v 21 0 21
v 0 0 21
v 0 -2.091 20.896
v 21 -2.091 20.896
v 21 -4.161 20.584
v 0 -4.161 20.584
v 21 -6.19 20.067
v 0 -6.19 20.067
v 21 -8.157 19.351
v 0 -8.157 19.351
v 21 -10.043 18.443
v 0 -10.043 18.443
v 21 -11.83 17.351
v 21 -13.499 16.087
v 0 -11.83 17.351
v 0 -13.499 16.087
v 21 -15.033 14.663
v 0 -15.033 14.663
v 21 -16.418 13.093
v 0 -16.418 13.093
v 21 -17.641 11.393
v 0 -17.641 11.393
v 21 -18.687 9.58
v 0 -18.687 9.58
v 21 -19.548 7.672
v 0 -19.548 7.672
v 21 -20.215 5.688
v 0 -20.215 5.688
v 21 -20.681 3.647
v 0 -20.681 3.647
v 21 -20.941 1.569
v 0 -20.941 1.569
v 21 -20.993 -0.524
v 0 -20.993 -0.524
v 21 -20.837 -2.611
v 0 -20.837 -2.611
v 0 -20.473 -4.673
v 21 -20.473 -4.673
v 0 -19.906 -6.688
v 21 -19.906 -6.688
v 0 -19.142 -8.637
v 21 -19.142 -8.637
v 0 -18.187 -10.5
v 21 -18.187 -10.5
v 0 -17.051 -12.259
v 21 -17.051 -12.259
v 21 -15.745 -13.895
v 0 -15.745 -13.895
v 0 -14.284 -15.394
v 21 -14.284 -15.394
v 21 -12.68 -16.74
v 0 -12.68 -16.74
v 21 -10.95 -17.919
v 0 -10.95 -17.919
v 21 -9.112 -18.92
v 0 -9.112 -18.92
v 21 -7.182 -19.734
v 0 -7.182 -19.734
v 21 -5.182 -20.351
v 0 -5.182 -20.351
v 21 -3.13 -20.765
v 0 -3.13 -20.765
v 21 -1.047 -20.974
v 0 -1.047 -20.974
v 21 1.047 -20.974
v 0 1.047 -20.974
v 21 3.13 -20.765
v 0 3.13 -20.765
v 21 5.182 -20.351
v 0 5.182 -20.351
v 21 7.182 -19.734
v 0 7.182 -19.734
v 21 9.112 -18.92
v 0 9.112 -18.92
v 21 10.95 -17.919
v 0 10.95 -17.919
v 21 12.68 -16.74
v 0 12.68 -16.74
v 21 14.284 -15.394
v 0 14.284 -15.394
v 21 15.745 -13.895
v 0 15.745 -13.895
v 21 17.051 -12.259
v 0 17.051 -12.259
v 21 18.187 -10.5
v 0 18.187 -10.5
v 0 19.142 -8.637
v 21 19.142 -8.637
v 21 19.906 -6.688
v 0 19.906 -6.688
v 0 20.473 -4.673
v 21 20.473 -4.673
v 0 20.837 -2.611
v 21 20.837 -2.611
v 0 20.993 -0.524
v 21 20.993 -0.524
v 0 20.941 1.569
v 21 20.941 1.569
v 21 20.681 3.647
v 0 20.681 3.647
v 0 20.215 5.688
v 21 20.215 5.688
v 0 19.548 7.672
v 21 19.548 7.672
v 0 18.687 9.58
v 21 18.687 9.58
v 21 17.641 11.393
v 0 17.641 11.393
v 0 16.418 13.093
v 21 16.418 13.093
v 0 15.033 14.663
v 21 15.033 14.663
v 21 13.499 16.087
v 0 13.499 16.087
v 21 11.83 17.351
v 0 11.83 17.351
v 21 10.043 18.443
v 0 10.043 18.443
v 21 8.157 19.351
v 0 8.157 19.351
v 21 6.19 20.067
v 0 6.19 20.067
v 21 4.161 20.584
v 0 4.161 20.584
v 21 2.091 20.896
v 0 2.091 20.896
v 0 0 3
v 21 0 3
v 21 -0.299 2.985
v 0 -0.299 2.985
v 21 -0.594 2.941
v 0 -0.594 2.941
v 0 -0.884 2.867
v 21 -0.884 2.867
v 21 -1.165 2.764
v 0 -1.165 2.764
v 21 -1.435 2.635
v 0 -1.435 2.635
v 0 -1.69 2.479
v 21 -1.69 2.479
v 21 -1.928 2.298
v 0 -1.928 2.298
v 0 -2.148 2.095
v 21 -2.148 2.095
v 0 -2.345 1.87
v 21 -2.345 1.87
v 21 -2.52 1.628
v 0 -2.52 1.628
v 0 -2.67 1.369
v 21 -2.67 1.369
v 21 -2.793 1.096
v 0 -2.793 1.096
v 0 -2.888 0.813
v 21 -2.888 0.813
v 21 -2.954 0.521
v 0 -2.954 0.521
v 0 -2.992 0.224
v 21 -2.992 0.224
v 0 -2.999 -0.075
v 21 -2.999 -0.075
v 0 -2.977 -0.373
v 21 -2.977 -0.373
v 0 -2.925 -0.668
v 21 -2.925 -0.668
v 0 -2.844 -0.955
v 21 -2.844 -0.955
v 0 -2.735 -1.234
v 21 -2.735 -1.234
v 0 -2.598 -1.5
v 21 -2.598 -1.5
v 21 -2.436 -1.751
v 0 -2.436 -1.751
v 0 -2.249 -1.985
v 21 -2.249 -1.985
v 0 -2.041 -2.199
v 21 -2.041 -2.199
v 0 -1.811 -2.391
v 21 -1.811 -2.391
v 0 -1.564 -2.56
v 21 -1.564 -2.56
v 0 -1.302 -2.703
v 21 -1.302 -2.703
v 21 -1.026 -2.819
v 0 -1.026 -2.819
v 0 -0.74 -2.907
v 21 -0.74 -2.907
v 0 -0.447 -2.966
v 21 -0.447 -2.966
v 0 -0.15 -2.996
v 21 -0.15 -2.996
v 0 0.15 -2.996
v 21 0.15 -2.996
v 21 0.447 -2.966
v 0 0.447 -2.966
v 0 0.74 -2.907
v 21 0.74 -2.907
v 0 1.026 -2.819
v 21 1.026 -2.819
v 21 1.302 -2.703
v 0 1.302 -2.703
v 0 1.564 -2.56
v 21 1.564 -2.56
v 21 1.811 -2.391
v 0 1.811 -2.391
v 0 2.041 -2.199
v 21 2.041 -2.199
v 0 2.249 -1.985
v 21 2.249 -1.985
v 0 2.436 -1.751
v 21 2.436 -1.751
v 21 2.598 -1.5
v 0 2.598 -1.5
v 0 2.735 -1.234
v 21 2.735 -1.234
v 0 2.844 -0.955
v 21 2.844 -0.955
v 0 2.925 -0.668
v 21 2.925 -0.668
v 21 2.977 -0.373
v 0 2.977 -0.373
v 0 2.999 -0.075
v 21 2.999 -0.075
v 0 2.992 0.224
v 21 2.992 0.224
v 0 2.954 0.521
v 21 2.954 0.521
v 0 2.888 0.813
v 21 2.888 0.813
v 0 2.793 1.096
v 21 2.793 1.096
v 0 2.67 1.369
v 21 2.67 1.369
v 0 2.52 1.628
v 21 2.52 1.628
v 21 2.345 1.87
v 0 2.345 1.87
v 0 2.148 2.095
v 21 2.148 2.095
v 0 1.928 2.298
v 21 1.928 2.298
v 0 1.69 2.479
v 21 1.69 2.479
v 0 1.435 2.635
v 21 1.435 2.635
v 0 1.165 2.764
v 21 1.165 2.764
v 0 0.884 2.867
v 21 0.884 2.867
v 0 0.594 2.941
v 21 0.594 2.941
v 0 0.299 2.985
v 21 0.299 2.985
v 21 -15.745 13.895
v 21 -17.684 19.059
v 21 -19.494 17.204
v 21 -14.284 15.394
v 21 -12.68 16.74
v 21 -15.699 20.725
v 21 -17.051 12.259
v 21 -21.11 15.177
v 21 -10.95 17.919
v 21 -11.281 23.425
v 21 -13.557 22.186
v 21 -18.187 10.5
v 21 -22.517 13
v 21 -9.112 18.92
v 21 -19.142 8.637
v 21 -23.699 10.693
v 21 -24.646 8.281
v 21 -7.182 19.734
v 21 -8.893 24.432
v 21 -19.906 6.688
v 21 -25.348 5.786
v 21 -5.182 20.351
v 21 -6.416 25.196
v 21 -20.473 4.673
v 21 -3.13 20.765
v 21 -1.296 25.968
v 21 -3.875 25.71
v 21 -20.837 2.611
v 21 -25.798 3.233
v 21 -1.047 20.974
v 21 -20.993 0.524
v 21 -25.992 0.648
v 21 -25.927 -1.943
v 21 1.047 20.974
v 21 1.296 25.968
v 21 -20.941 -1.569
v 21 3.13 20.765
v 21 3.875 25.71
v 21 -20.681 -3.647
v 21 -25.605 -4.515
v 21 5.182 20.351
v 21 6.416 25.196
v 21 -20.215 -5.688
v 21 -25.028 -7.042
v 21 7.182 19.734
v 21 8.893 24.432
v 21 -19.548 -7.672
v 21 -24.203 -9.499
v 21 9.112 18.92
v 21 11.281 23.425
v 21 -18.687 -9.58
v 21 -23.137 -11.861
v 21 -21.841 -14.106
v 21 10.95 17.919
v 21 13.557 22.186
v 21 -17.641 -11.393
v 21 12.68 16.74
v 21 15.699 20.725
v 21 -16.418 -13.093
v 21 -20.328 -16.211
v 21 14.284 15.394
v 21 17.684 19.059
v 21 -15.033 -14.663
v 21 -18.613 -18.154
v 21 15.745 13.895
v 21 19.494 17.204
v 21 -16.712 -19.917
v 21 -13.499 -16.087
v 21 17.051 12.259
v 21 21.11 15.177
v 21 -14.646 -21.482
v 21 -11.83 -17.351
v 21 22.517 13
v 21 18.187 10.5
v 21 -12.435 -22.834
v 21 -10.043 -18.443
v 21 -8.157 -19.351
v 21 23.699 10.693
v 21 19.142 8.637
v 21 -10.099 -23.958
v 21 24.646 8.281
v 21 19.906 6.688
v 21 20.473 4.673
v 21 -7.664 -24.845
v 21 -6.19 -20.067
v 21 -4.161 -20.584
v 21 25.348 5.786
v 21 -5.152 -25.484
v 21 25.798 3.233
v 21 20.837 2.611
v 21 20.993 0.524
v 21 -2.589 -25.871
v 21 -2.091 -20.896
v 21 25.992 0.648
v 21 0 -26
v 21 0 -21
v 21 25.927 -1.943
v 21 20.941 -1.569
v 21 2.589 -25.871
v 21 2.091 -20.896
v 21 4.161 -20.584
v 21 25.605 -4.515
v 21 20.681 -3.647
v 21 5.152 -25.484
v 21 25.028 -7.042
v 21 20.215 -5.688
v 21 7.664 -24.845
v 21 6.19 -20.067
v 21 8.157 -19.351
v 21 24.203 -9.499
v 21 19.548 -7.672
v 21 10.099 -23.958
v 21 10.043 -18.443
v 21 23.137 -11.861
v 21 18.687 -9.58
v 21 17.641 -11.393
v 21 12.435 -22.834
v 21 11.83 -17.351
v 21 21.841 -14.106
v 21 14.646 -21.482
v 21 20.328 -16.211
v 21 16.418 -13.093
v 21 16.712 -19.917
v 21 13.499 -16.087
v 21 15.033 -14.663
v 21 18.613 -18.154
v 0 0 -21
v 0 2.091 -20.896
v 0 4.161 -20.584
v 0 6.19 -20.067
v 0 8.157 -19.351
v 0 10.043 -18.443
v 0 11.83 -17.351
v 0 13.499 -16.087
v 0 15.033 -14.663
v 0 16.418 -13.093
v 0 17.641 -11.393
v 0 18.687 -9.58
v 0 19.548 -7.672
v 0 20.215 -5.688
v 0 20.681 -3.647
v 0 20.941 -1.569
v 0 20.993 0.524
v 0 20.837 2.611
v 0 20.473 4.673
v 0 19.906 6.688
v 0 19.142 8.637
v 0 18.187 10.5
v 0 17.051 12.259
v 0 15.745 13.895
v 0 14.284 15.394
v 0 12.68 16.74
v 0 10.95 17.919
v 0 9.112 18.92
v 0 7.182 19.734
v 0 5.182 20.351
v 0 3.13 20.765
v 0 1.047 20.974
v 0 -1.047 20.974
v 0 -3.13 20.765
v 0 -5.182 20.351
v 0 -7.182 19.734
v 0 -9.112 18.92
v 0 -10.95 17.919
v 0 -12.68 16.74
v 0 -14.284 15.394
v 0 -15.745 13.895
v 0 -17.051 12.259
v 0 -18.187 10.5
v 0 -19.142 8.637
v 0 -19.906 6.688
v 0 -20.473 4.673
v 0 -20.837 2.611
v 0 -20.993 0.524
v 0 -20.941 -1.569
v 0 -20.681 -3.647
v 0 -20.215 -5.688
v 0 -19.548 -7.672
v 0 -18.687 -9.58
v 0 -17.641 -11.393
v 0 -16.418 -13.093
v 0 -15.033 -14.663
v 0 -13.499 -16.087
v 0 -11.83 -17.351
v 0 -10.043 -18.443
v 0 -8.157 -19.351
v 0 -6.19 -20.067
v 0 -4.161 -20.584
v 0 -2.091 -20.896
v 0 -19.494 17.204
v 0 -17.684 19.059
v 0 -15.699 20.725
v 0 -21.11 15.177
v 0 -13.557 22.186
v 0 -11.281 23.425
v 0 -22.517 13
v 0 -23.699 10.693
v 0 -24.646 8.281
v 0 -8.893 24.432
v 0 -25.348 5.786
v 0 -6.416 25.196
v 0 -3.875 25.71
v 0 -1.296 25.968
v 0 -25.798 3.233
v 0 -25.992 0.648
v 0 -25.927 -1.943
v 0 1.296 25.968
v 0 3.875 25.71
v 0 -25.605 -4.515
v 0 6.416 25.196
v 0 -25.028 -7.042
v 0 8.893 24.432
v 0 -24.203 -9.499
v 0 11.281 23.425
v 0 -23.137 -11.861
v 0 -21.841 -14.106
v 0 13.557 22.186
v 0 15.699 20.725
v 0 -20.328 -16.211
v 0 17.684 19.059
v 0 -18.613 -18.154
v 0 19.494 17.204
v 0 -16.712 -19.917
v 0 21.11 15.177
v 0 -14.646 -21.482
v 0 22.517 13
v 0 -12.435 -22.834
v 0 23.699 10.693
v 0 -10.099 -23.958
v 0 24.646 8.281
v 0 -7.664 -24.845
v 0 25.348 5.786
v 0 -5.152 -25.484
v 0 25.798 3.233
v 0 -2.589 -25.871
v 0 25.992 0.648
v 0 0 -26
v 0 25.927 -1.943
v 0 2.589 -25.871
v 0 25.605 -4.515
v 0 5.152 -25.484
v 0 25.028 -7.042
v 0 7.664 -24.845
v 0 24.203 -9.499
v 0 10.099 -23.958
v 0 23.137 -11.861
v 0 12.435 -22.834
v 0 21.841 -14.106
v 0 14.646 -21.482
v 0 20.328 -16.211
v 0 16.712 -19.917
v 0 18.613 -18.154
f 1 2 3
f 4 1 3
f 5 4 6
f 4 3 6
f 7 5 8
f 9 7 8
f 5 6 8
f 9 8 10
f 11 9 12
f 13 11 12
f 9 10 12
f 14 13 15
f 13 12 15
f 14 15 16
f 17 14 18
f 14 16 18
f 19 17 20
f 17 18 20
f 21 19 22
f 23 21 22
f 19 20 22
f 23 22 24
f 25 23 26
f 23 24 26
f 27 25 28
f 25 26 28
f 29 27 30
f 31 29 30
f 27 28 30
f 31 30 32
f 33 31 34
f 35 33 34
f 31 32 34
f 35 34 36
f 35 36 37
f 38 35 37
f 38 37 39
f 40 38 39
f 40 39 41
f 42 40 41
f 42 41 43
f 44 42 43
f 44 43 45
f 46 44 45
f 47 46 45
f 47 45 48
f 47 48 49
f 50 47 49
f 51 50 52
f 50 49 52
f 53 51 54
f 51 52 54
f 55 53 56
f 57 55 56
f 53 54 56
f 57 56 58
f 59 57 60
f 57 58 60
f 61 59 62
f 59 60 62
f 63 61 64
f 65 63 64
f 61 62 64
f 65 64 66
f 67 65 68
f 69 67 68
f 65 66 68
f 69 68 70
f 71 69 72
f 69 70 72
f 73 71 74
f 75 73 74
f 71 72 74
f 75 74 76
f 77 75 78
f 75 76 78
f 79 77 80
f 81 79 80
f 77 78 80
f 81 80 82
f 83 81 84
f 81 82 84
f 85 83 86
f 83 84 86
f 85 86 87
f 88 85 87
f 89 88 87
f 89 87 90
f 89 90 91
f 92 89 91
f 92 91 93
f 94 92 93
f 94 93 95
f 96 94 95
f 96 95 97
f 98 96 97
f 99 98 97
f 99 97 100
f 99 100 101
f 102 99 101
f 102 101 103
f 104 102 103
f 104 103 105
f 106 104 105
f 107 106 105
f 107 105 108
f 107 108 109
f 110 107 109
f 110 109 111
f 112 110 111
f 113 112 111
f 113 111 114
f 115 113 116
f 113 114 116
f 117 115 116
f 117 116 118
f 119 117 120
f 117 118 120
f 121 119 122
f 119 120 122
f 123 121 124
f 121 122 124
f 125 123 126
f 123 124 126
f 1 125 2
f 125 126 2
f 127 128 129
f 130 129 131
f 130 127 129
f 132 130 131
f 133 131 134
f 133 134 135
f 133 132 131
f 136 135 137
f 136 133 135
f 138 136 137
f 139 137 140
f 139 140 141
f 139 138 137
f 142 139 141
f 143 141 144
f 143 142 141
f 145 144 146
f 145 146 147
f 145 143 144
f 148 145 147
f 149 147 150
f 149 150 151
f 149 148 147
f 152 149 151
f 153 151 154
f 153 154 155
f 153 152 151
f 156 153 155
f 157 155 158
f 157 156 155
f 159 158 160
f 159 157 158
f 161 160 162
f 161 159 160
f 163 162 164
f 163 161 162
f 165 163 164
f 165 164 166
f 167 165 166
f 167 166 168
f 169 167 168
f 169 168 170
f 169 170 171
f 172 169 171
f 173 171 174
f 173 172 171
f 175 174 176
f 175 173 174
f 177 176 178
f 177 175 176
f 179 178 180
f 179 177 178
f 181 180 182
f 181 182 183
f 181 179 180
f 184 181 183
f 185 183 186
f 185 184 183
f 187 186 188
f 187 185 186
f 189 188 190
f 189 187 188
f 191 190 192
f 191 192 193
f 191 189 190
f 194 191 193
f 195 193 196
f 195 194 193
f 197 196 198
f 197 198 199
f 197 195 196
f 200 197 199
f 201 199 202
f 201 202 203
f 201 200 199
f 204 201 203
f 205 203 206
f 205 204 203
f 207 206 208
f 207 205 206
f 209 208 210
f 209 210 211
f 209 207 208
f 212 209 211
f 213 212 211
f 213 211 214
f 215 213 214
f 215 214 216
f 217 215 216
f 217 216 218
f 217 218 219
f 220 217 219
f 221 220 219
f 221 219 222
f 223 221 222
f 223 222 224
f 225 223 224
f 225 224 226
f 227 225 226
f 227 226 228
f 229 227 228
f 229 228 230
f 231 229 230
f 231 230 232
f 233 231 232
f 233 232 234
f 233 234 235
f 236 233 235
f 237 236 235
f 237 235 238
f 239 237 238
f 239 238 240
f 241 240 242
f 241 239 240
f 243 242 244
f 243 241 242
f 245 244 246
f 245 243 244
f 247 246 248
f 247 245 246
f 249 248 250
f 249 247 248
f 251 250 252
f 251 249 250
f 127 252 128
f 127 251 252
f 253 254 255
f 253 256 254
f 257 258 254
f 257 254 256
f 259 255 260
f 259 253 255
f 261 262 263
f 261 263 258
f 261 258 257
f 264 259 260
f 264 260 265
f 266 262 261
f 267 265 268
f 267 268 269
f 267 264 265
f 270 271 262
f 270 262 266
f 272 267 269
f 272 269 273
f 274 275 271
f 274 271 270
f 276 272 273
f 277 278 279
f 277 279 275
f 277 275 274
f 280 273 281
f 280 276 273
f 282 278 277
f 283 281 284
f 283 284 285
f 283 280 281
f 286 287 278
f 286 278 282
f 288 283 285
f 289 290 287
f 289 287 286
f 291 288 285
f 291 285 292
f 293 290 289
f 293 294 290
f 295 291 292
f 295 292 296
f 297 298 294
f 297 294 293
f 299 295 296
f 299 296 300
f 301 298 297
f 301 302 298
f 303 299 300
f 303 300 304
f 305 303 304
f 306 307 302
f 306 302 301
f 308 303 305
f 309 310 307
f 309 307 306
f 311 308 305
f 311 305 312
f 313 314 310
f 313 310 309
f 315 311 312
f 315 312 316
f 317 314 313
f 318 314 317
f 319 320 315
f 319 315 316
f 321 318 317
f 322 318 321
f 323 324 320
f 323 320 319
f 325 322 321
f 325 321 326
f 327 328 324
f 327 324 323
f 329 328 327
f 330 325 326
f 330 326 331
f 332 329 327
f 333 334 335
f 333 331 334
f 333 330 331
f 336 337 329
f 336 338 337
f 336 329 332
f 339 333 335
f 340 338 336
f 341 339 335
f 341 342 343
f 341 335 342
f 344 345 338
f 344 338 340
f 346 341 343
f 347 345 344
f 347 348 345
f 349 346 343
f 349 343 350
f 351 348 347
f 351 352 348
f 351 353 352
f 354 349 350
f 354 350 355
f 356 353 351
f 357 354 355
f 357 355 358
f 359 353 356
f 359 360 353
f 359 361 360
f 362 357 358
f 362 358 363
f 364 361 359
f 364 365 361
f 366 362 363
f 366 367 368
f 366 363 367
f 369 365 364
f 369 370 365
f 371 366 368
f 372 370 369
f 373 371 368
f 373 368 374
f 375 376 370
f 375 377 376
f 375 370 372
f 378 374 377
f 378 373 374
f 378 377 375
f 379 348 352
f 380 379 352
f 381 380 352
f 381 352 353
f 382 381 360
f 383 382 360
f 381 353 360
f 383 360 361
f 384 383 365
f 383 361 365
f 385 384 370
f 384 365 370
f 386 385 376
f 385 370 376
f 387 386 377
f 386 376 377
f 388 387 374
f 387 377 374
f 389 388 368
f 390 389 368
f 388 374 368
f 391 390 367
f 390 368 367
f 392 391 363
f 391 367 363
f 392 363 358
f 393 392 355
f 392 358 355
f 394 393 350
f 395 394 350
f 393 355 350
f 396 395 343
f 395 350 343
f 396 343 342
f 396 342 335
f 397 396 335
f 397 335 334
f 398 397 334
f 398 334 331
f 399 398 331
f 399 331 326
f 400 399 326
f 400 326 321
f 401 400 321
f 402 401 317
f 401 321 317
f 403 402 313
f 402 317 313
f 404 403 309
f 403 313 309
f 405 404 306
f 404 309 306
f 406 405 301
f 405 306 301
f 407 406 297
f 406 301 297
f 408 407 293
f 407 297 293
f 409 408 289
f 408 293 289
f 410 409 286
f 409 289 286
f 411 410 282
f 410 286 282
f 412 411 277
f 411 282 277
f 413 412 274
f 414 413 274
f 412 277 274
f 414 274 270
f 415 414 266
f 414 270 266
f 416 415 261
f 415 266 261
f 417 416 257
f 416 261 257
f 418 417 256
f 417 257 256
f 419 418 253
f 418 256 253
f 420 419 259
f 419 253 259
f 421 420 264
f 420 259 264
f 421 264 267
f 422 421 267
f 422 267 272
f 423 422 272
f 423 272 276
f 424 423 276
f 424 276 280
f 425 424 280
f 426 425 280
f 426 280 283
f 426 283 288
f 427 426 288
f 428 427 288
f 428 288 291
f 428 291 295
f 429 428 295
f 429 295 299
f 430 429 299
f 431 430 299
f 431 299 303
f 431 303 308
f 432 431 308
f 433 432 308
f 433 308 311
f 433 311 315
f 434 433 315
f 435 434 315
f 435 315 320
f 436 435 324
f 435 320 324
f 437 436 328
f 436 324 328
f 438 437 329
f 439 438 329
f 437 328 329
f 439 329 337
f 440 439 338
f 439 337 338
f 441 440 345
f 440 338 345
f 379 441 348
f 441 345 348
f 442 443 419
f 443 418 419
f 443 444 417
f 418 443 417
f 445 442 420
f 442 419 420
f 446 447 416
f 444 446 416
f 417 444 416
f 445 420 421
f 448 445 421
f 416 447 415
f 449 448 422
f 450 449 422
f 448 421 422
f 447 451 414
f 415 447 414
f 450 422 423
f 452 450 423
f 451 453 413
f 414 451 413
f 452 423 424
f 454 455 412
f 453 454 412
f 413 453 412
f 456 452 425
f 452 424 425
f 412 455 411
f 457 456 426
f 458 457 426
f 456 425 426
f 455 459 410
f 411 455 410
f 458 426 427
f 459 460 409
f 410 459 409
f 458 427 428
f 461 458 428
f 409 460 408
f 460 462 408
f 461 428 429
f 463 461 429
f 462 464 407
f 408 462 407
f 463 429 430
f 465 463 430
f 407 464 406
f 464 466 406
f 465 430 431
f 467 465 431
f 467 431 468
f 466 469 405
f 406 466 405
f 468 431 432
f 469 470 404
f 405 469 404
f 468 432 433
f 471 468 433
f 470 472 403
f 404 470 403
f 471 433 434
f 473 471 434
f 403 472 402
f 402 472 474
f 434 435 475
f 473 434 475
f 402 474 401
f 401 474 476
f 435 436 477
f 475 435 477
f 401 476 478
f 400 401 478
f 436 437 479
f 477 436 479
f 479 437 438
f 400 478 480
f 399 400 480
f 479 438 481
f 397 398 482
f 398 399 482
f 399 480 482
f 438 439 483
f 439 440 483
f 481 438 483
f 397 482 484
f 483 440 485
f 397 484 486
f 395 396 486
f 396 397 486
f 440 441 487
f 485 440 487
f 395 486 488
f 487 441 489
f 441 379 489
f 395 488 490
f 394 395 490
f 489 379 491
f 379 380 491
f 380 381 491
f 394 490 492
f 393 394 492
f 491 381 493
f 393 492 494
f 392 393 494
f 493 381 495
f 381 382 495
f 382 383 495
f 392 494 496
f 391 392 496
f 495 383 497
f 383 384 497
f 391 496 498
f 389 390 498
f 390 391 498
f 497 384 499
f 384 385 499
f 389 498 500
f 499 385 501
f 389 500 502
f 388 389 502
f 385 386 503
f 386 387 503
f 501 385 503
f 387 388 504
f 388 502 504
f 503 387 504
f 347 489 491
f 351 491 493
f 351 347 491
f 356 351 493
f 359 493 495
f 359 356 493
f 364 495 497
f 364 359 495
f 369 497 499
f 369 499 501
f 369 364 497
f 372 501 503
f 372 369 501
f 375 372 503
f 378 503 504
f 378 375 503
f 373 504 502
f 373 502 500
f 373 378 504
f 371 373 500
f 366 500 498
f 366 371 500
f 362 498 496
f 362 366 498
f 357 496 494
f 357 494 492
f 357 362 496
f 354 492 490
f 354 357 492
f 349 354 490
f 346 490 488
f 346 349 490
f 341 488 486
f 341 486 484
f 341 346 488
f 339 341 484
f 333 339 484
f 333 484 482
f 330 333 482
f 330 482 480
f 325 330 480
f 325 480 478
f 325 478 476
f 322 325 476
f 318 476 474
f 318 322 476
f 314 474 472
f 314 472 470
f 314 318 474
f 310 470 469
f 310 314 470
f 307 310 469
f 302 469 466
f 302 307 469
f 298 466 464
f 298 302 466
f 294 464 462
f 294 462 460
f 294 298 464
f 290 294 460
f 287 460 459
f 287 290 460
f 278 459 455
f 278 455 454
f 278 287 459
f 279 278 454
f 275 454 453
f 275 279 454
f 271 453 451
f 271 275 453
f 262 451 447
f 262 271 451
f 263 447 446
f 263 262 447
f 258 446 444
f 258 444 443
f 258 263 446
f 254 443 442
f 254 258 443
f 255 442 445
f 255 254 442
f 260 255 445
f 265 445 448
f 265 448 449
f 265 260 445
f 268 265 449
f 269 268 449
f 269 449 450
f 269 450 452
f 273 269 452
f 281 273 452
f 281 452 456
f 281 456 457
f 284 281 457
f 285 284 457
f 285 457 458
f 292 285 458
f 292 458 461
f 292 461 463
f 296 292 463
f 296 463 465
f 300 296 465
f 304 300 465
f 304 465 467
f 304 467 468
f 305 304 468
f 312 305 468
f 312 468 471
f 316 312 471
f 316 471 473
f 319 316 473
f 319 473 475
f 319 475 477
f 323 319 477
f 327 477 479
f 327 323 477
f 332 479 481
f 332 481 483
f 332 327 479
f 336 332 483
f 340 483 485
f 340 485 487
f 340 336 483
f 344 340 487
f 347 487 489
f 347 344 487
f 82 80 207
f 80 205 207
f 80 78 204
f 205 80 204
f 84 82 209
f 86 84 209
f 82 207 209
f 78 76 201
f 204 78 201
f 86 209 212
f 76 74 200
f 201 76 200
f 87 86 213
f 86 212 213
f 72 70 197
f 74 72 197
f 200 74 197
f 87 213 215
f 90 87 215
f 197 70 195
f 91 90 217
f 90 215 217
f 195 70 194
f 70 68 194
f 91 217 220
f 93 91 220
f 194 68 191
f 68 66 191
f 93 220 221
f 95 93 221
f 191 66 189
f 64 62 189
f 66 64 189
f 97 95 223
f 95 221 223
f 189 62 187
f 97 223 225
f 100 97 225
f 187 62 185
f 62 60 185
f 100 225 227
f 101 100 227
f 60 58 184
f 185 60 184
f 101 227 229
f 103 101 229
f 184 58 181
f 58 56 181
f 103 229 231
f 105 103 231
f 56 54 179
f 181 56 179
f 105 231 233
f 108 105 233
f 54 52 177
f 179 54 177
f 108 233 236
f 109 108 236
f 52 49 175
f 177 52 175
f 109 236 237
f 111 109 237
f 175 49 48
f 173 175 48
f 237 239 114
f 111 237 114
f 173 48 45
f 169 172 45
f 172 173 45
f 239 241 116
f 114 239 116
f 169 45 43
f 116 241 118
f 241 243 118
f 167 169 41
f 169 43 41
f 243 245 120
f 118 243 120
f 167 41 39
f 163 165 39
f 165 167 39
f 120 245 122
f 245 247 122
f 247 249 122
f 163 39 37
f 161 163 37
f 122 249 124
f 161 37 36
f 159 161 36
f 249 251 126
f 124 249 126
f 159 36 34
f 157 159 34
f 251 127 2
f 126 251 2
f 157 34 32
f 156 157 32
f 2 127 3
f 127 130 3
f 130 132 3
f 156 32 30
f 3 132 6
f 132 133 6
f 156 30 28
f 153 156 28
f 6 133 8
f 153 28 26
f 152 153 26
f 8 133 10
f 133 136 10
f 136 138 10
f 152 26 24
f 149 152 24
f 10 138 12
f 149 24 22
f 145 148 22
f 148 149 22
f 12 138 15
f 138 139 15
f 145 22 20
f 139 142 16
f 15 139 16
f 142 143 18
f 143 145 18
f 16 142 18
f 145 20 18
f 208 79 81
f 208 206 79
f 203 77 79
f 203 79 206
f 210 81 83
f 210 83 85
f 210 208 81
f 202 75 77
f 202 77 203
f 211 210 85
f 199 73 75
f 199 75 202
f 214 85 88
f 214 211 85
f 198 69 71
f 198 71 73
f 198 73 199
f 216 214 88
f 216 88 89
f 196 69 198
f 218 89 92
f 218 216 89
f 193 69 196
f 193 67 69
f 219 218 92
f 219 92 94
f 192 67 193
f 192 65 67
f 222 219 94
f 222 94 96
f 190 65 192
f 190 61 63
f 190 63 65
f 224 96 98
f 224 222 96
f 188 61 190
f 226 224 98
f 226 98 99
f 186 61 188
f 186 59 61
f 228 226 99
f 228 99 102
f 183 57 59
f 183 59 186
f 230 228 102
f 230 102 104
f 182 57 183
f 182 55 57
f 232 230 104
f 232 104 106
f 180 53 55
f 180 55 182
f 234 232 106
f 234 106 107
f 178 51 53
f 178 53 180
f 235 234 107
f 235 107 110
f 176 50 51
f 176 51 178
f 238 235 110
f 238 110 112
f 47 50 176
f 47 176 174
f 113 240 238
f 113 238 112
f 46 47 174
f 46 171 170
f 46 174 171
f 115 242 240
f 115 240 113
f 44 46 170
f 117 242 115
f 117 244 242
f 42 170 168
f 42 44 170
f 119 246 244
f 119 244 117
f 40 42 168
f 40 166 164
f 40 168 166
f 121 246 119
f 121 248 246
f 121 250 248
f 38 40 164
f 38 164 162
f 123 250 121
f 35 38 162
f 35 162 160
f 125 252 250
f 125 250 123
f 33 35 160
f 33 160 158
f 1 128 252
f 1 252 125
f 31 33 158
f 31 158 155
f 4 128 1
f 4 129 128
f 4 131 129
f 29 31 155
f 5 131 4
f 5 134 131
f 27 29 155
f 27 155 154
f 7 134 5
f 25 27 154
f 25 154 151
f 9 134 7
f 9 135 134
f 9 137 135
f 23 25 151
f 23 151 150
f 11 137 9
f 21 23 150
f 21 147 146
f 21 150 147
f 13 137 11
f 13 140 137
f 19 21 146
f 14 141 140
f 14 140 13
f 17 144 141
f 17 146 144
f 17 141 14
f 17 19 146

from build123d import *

# Parameters (mm, degrees)
SKETCH1_R           = 21
SKETCH1_R_2         = 3
BOSS_EXTRUDE1_DEPTH = 21
SKETCH2_R           = 26
SKETCH2_R_2         = 21
BOSS_EXTRUDE2_DEPTH = 21


with BuildPart() as part:
    # Sketch1 → Boss-Extrude1 (new body)
    with BuildSketch(Plane(origin=(0, 0, 0), x_dir=(0, 0, -1), z_dir=(1, 0, 0))):
        with Locations(Location((0, 0, 0), (0, 0, 180))):
            Circle(SKETCH1_R)
        with Locations(Location((0, 0, 0), (0, 0, 180))):
            Circle(SKETCH1_R_2, mode=Mode.SUBTRACT)
    extrude(amount=BOSS_EXTRUDE1_DEPTH)


with BuildPart() as body_2:
    # Sketch2 → Boss-Extrude2 (new body)
    with BuildSketch(Plane(origin=(21, 0, 0), x_dir=(0, 0, -1), z_dir=(1, 0, 0))):
        Circle(SKETCH2_R)
        Circle(SKETCH2_R_2, mode=Mode.SUBTRACT)
    extrude(amount=-BOSS_EXTRUDE2_DEPTH)


solid = Compound([part.part, body_2.part])
